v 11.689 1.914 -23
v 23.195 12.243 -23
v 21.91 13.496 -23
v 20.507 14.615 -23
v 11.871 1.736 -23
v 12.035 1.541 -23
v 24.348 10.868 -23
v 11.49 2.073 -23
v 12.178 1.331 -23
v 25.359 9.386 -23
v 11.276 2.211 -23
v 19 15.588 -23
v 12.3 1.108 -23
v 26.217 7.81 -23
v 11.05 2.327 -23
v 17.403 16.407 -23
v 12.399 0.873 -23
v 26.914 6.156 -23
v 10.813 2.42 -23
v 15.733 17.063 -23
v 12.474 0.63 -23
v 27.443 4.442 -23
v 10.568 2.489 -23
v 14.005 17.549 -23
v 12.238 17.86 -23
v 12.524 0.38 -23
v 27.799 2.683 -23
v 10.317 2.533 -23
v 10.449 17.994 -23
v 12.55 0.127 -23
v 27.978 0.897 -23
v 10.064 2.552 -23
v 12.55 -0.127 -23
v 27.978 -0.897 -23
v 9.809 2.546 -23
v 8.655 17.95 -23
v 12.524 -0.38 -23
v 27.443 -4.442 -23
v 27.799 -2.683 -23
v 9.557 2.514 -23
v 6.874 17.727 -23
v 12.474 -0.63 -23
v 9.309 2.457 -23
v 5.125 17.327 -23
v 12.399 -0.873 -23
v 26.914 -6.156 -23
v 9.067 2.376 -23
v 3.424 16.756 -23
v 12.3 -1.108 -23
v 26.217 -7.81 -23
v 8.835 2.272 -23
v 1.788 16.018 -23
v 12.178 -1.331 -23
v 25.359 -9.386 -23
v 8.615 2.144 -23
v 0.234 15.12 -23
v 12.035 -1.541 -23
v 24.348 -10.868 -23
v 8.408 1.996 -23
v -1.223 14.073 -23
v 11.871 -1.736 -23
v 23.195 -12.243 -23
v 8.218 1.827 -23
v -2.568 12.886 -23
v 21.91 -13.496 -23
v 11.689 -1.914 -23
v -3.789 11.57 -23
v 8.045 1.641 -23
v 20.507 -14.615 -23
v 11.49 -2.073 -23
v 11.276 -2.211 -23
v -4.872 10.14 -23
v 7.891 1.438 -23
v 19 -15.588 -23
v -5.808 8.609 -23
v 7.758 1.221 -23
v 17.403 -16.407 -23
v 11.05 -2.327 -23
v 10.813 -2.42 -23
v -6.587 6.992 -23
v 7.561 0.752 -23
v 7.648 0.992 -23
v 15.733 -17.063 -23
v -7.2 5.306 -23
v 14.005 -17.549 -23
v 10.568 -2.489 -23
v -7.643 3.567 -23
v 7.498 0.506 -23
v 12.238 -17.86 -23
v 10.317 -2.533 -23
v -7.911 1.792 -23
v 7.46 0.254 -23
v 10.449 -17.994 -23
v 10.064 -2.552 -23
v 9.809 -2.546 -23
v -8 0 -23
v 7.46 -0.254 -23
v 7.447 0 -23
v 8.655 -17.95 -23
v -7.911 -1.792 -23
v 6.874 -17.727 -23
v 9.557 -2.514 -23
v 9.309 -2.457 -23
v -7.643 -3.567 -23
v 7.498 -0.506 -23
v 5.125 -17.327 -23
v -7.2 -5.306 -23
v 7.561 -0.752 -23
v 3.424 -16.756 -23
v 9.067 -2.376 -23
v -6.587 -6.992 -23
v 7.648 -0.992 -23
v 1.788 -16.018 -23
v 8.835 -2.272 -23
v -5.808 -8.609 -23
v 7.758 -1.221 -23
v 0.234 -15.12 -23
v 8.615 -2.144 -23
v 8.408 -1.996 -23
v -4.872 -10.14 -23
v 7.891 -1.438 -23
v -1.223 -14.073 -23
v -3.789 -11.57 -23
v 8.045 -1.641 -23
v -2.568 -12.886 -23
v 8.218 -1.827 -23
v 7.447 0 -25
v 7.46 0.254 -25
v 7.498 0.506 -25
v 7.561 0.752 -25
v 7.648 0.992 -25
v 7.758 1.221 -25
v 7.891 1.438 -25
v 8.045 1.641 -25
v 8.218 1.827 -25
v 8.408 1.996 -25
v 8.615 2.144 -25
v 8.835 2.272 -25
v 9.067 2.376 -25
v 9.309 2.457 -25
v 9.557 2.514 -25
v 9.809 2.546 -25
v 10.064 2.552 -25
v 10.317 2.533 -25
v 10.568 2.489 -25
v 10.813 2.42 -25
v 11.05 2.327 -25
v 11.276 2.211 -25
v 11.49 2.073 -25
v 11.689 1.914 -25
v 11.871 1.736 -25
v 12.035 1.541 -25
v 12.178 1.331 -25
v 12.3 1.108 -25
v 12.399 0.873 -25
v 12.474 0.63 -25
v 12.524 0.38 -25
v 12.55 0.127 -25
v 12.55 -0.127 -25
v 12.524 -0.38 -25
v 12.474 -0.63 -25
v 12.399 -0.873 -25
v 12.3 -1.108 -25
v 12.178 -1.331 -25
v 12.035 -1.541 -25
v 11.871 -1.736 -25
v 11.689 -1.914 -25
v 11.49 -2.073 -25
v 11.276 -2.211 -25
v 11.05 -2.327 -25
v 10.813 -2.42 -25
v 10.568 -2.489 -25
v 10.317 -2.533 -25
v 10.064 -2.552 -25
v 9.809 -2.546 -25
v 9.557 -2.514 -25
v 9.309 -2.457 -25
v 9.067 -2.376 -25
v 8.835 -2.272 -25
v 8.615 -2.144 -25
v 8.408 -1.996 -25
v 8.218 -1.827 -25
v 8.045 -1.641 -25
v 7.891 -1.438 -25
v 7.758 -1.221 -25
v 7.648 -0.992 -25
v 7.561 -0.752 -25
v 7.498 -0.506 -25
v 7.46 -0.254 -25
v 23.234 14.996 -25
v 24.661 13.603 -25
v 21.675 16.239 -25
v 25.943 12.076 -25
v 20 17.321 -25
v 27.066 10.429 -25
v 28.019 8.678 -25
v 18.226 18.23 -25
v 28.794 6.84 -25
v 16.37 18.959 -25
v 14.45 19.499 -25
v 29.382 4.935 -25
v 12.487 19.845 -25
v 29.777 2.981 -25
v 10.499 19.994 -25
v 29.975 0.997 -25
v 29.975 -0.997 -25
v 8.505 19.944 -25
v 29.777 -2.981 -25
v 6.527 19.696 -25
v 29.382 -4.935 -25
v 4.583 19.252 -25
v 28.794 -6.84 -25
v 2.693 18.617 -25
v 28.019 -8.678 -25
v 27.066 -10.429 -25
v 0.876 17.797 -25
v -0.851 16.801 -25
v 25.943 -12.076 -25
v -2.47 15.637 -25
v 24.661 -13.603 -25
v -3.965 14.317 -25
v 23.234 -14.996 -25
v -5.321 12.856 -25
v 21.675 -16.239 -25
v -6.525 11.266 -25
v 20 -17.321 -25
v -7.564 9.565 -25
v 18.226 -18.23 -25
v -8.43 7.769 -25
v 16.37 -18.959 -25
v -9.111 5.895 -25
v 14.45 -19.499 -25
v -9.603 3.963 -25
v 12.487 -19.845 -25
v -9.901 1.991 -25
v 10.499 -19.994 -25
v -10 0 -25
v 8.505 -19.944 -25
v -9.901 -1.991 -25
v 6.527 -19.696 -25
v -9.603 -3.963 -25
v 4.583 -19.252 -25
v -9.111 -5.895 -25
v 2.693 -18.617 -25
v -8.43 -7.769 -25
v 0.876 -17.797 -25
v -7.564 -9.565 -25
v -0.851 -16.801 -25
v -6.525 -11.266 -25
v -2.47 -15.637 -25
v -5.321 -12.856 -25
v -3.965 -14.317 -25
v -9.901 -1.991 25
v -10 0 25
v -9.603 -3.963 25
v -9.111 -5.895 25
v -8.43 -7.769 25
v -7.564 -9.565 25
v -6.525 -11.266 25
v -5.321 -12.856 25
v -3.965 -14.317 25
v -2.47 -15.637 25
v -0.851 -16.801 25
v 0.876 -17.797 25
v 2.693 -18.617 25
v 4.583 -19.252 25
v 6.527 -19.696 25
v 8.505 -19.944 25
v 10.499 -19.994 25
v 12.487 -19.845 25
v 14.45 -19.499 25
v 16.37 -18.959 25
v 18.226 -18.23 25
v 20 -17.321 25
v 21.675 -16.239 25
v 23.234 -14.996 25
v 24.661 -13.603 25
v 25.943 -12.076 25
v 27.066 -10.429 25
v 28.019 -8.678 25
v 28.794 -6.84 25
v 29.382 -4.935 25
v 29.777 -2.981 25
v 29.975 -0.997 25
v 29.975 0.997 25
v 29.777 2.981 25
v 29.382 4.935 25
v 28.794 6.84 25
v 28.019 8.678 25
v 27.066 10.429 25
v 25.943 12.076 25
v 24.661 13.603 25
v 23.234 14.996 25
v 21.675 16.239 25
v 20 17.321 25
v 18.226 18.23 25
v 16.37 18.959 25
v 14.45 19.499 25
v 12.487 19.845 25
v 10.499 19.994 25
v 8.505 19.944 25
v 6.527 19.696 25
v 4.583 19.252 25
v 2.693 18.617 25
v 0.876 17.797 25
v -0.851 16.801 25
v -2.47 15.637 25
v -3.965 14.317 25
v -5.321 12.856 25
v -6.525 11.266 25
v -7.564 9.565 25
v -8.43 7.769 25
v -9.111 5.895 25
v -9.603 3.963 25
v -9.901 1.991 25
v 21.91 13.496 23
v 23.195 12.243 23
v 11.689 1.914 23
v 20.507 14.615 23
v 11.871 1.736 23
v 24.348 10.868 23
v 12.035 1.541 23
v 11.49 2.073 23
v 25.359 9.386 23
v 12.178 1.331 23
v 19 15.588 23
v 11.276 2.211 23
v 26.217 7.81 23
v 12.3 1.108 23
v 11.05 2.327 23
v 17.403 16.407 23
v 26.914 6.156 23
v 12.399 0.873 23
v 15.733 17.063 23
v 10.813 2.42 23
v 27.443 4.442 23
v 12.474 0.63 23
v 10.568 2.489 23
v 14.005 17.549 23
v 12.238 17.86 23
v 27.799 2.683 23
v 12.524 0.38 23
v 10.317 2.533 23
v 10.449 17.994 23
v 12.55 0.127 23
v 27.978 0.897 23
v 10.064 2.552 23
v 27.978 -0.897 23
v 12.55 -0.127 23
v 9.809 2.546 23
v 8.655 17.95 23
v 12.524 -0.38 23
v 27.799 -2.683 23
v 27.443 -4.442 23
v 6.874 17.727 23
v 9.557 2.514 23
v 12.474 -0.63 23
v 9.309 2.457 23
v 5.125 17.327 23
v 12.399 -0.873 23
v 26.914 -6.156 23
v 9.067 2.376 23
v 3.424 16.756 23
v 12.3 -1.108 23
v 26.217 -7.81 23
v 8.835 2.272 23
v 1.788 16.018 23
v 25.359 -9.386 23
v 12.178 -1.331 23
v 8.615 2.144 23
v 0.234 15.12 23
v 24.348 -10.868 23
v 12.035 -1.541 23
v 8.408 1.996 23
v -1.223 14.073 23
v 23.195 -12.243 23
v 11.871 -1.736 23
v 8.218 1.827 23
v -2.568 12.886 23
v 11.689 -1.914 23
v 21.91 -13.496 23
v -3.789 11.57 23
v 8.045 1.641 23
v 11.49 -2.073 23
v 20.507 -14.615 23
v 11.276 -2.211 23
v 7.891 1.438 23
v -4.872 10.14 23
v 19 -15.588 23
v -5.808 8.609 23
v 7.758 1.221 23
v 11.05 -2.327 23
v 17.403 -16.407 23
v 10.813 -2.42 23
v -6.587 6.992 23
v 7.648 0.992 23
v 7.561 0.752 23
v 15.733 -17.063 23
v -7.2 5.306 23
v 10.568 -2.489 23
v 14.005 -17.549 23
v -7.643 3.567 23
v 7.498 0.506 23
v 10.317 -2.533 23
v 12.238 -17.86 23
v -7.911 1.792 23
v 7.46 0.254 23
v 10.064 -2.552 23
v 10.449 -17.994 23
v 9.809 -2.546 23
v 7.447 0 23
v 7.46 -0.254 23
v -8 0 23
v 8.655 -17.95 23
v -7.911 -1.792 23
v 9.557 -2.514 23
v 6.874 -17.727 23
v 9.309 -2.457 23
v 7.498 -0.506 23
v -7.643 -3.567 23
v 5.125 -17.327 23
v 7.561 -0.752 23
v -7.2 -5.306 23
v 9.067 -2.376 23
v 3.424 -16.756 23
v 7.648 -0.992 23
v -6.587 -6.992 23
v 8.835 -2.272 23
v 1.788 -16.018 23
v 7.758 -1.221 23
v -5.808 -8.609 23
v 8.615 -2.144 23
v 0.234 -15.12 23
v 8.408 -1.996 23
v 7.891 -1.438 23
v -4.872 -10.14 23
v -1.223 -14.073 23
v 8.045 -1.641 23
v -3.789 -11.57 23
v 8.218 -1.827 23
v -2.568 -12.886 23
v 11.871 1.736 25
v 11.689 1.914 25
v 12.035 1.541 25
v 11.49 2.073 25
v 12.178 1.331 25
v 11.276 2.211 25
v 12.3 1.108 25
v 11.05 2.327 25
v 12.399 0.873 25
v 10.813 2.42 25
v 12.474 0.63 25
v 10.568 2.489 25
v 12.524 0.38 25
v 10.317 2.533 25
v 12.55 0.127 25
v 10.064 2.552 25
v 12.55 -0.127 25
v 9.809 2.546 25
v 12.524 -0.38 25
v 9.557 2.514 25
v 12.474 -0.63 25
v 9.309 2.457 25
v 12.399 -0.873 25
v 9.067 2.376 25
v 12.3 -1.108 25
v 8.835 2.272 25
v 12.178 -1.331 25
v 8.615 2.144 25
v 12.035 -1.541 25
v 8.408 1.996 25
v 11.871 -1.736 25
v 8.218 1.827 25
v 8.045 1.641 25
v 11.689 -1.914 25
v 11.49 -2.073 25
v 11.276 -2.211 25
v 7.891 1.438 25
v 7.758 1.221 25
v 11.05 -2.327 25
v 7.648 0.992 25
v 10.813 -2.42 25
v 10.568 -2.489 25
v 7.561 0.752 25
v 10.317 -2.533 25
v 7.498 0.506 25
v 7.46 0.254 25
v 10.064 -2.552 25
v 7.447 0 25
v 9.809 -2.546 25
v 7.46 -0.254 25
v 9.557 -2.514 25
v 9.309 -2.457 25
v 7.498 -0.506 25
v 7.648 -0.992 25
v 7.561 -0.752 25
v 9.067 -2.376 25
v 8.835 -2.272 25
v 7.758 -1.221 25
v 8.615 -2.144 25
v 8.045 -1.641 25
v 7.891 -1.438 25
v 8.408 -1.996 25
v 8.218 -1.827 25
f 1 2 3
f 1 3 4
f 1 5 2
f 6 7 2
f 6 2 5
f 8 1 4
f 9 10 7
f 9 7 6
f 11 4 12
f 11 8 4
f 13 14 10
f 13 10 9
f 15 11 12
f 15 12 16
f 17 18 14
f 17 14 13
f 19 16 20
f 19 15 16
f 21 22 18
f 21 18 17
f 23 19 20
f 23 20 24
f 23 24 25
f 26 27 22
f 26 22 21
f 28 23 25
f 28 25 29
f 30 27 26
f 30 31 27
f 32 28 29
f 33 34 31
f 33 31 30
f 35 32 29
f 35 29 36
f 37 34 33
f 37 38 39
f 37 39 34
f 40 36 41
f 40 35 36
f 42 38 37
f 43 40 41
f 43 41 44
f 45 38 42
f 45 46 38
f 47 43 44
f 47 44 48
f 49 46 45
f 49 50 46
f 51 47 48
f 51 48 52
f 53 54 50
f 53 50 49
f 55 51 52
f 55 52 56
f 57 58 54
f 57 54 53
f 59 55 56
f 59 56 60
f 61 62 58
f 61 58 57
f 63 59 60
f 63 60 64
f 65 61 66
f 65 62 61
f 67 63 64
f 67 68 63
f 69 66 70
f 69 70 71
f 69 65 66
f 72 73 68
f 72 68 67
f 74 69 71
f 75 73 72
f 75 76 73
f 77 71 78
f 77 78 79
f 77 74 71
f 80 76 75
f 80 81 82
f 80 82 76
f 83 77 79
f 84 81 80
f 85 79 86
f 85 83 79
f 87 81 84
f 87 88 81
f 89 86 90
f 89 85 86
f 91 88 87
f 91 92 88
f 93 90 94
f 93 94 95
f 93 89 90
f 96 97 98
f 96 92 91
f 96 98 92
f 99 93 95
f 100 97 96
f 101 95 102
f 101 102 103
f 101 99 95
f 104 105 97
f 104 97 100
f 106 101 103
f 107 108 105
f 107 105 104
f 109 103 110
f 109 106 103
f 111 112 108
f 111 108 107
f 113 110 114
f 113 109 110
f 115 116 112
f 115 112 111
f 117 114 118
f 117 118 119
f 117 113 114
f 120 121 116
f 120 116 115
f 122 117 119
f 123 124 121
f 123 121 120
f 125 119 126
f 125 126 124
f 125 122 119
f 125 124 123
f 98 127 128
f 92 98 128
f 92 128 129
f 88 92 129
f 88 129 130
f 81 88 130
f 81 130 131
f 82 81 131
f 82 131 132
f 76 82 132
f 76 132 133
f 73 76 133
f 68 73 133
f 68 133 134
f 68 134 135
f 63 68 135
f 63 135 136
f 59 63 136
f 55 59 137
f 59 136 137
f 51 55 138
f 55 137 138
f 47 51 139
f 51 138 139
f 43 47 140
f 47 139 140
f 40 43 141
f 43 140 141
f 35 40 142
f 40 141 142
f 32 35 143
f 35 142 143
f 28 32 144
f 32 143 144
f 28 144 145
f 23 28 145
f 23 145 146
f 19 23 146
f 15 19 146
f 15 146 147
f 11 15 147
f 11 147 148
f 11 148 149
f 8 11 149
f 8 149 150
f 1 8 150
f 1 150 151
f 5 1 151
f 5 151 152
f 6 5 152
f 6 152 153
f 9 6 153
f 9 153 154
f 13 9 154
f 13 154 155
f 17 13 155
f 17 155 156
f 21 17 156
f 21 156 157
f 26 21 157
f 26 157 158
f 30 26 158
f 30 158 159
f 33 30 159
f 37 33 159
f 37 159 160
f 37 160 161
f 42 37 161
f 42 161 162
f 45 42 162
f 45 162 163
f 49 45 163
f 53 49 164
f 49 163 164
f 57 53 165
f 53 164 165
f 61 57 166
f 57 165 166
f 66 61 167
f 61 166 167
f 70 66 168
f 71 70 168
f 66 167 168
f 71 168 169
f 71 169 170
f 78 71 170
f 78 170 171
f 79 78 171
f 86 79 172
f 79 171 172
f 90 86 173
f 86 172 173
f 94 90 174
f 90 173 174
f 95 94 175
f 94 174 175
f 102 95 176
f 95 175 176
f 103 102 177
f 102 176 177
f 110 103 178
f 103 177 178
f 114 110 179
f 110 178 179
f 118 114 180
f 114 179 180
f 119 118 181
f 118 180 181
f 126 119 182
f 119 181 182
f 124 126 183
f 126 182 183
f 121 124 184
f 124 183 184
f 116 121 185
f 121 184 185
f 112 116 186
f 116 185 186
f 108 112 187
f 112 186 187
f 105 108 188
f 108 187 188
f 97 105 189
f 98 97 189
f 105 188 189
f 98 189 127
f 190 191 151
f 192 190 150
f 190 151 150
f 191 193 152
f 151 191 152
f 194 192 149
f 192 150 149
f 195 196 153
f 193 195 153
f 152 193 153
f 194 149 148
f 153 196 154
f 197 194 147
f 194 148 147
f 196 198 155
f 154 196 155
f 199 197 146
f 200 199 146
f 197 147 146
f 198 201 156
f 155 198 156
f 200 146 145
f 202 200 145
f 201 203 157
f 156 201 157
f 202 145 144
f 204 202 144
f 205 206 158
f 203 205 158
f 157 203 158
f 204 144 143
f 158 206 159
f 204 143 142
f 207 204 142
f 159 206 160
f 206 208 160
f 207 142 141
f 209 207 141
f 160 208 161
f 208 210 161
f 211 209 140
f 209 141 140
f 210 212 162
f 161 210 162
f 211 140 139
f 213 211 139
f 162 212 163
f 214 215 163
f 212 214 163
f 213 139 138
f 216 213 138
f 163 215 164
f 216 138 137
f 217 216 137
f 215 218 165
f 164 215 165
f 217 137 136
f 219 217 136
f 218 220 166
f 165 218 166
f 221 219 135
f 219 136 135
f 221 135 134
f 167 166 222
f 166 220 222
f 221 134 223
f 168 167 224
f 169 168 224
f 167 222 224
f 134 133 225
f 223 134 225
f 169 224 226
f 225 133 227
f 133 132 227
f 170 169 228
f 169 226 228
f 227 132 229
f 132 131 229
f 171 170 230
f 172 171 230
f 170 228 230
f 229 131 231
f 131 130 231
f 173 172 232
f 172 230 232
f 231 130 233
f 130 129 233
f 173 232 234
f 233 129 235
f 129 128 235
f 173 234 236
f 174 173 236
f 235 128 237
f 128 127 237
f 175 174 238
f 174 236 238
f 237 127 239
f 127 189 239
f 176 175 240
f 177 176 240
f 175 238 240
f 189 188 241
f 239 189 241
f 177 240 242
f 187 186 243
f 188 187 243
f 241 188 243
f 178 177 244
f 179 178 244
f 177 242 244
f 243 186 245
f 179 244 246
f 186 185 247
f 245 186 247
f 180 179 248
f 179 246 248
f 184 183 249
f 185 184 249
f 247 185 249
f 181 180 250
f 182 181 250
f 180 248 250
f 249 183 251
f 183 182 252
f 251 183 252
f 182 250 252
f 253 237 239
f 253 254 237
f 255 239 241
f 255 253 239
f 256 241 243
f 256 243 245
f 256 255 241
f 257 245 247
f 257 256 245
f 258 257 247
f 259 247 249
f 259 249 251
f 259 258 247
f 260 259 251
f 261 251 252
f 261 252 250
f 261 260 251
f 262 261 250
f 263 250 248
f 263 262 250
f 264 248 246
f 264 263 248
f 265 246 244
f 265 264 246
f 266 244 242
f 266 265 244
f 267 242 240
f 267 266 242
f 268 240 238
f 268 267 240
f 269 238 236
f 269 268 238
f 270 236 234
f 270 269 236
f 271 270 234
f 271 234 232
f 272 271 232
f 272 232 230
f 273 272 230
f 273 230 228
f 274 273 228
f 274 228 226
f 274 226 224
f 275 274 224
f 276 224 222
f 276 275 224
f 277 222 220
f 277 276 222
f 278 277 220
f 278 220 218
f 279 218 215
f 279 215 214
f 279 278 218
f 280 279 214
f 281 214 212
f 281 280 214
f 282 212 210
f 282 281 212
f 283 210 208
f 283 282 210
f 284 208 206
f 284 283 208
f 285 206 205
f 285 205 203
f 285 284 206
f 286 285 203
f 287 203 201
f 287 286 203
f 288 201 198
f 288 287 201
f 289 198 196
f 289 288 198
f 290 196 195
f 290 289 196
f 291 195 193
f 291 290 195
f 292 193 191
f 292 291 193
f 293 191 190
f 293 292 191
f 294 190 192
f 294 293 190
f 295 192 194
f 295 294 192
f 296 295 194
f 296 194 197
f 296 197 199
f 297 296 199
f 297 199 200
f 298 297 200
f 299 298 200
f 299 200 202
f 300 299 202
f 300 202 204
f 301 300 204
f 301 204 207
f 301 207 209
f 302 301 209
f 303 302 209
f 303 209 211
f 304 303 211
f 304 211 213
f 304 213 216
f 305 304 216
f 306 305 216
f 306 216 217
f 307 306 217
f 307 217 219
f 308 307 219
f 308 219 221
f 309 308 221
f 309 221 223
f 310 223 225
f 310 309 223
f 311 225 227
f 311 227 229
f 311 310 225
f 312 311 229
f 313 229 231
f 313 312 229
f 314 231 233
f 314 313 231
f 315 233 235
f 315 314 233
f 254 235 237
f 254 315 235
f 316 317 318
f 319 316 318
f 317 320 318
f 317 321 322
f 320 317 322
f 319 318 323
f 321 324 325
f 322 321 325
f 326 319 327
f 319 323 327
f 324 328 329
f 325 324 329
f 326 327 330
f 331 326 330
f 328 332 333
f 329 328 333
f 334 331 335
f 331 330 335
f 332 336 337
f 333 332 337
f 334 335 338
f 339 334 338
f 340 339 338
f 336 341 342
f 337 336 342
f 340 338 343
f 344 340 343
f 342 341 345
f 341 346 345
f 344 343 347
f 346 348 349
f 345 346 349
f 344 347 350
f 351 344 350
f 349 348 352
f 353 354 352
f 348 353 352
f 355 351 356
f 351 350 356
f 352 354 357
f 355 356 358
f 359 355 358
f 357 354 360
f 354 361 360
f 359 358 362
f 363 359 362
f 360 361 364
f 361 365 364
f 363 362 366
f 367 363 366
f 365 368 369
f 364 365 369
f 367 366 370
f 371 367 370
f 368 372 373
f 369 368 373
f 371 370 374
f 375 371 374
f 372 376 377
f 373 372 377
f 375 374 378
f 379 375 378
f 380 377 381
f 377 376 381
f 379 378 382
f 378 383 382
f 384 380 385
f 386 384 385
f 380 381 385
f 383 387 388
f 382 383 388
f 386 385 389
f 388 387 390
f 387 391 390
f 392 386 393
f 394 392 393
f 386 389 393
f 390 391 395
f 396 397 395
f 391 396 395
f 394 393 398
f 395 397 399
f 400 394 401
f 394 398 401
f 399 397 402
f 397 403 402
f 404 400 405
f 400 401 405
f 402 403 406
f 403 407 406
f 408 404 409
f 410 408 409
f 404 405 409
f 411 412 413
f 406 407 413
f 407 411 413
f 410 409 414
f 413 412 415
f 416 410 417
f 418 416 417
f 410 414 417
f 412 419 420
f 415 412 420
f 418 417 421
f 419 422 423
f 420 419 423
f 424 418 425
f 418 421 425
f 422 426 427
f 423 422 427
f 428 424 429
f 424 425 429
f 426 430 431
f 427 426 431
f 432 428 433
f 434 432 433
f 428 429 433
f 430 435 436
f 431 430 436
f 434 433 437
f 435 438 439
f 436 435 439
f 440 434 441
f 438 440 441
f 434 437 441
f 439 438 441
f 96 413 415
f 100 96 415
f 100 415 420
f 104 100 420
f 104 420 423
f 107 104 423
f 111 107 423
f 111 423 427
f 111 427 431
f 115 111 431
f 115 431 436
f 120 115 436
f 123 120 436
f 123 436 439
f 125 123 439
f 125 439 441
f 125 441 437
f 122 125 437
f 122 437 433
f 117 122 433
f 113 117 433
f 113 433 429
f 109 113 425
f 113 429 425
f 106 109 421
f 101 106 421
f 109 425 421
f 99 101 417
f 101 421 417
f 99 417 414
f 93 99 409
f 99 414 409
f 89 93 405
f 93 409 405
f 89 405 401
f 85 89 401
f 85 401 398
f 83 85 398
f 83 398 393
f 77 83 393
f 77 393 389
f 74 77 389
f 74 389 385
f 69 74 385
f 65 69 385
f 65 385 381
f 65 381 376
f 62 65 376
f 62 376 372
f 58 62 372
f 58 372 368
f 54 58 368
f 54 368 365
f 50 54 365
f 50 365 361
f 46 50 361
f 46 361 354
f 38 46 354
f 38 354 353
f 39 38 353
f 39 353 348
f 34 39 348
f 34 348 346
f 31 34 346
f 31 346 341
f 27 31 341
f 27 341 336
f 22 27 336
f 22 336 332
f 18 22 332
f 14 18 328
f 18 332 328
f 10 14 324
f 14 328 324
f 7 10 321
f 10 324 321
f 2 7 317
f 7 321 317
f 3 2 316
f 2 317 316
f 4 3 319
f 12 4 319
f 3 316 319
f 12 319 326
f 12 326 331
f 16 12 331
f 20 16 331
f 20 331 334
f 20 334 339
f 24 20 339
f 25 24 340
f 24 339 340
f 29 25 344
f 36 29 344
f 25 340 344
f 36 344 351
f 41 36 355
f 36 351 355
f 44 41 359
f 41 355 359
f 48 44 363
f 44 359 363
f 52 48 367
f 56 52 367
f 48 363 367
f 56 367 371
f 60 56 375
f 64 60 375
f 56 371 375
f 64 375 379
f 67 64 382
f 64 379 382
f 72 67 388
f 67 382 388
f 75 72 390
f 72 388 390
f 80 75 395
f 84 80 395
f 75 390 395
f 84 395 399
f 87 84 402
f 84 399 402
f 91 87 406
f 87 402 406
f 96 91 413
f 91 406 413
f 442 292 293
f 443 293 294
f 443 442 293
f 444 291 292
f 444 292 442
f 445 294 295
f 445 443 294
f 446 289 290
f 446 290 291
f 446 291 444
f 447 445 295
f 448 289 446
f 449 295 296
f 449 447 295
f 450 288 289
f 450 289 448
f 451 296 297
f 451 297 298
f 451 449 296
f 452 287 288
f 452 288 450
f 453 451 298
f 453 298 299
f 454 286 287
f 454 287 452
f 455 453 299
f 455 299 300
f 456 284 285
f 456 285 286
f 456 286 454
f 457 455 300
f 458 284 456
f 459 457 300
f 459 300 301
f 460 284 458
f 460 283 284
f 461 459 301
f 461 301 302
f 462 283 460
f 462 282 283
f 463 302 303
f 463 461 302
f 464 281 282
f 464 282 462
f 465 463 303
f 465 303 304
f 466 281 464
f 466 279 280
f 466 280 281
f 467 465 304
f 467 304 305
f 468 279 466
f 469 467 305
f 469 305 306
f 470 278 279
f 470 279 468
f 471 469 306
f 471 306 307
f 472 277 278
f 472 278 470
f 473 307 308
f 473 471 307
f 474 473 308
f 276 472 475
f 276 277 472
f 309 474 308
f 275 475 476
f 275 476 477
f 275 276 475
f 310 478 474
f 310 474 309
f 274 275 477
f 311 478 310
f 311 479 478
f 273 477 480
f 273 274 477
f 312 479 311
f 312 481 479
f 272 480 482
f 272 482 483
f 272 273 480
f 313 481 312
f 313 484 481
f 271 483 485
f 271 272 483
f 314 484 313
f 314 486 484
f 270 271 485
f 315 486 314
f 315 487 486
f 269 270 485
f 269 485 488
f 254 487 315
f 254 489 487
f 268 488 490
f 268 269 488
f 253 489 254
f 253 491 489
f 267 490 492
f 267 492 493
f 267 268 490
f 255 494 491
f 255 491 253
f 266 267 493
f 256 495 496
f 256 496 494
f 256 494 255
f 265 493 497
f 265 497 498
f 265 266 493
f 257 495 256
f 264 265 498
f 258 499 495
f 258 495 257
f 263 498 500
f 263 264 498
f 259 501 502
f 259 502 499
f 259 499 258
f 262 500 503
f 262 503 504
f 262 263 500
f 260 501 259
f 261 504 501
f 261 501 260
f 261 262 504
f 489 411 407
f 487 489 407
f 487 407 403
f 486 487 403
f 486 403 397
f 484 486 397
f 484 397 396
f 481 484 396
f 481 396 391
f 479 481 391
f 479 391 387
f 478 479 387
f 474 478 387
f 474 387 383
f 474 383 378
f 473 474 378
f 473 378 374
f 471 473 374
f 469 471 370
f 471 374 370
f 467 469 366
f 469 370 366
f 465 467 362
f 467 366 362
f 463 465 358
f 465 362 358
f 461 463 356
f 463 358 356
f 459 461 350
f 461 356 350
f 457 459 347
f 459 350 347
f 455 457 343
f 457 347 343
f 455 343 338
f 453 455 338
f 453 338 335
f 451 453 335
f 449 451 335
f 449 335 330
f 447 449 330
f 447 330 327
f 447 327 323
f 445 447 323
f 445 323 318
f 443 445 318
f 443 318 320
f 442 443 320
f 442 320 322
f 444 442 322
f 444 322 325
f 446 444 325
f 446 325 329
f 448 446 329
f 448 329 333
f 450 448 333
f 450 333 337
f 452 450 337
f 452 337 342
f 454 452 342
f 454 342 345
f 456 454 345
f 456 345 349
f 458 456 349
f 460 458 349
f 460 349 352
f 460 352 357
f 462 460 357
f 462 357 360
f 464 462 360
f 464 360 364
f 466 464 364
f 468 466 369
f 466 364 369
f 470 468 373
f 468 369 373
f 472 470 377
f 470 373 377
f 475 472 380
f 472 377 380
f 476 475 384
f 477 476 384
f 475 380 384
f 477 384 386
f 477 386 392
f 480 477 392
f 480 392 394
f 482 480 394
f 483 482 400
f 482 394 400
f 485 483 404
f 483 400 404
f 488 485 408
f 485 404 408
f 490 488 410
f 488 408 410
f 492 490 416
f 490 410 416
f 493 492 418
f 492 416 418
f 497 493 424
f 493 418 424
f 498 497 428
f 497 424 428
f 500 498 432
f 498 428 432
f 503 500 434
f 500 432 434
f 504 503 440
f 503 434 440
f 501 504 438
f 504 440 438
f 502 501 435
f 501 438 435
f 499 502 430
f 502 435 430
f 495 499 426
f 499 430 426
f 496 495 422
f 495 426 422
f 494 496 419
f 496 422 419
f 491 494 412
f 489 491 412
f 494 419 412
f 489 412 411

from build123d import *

# Parameters (mm, degrees)
F0_W = 20
F0_H = 50
F2_T = -2
F4_D = 5.1054


with BuildPart() as f1:
    # F0 (on Front) → F1 (revolve)
    with BuildSketch(Plane.XZ):
        Rectangle(F0_W, F0_H)
    revolve(axis=Axis((10, 0, 0), (0, 0, 1)))

    # F2 (hollow: no face is removed)
    offset(amount=F2_T, mode=Mode.SUBTRACT)

    # F4 (through all)
    with Locations(Plane.XY.offset(25)):
        with Locations((10, 0)):
            Hole(F4_D / 2)


solid = f1.part
